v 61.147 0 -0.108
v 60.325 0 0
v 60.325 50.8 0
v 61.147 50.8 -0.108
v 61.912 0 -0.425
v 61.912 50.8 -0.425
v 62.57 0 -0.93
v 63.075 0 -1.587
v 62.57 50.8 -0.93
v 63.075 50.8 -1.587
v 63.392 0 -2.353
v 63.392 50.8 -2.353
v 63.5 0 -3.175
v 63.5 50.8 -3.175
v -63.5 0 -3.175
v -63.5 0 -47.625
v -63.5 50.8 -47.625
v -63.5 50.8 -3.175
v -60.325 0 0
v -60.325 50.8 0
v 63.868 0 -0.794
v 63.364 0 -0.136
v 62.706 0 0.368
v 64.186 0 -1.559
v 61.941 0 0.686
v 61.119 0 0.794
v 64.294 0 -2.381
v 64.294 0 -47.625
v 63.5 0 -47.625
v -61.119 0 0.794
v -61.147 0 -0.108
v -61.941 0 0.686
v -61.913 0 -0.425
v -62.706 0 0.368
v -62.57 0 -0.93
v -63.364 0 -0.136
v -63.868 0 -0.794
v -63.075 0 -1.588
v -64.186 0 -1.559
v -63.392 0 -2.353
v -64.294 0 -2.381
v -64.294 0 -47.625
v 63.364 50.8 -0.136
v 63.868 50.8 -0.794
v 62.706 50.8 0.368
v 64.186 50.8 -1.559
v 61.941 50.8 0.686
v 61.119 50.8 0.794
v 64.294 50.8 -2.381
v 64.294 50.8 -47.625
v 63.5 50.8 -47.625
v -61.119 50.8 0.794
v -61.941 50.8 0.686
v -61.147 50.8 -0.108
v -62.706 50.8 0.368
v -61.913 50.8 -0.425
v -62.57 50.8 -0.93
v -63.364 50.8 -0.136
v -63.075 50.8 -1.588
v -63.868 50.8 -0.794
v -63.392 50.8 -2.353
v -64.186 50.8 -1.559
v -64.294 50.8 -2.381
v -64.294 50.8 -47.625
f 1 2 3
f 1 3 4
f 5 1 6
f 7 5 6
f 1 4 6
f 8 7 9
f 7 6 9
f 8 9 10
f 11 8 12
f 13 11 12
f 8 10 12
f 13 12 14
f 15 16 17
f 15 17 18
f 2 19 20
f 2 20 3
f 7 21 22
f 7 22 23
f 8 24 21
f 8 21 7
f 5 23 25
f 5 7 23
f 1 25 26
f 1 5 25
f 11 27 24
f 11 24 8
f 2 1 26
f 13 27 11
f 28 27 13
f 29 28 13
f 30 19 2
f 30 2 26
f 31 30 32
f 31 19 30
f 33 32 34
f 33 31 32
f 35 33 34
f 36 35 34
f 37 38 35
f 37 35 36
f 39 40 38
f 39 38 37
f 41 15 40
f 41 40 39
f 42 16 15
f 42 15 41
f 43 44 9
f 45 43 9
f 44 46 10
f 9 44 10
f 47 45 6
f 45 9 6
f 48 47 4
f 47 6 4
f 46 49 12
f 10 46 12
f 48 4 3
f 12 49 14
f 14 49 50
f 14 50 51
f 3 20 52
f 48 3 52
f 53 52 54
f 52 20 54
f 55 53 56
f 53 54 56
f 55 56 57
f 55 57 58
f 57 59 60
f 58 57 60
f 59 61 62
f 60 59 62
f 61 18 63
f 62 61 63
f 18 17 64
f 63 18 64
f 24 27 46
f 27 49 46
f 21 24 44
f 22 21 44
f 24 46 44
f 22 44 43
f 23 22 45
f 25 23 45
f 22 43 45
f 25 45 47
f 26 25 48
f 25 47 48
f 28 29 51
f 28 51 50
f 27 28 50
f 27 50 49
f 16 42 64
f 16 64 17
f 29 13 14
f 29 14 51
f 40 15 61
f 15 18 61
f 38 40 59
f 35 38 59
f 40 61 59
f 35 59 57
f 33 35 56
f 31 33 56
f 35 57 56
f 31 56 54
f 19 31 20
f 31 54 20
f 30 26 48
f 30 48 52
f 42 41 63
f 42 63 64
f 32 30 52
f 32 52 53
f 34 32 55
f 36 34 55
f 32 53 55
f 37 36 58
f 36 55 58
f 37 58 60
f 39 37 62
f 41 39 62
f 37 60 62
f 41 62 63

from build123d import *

# Parameters (mm, degrees)
BOSS_EXTRUDE1_DEPTH = 50.8
FILLET1_R           = 3.175


with BuildPart() as part:
    # Sketch1 → Boss-Extrude1 (new body)
    with BuildSketch(Plane(origin=(0, 0, 0), x_dir=(1, 0, 0), z_dir=(0, 1, 0))):
        Polygon((-64.29375, 47.625), (-63.5, 47.625), (-63.5, 0), (63.5, 0), (63.5, 47.625), (64.29375, 47.625), (64.29375, -0.79375), (-64.29375, -0.79375), align=None)
    extrude(amount=BOSS_EXTRUDE1_DEPTH)

    # Fillet1
    fillet1_edges = [part.edges().sort_by_distance(p)[0] for p in [
        (-63.5, 25.4, 0),
        (63.5, 25.4, 0),
        (64.29375, 25.4, 0.79375),
        (-64.29375, 25.4, 0.79375),
    ]]
    fillet(fillet1_edges, radius=FILLET1_R)


solid = part.part
